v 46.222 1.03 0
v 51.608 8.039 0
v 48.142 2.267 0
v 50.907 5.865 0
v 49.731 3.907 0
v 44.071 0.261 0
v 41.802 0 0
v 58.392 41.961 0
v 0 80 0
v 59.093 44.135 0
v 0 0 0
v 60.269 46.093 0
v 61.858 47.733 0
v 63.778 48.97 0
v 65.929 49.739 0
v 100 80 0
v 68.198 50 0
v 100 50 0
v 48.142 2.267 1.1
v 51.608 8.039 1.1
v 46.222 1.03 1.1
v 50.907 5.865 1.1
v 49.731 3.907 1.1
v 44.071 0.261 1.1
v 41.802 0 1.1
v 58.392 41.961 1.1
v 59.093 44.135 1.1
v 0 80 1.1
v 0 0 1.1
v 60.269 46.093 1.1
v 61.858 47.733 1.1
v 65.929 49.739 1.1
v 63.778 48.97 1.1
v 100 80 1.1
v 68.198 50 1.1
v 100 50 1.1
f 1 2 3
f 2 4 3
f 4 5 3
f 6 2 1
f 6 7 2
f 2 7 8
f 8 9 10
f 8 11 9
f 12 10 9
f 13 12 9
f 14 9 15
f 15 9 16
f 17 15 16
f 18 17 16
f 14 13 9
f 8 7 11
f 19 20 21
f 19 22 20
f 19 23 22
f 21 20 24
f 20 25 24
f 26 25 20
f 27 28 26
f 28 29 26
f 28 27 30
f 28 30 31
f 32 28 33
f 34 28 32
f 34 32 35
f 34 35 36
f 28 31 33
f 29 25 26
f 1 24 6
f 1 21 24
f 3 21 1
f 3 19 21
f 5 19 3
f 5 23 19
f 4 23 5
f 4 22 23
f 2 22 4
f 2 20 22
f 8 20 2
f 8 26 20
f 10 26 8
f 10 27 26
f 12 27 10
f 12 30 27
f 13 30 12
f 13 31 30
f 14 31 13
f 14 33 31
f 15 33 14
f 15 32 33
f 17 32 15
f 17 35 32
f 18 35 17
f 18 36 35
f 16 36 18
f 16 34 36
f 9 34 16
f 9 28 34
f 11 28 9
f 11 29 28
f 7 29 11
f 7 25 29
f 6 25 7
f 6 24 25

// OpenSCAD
// file: fillet.scad
//  openSCAD functions
//  https://github.com/dinther/openSCAD_functions
//
//  Note:
//      fillet uses three other helper functions:
//          ellipseArc
//              ellipseCenter
//              segments
//
//      These functions can be useful in themselves but can also be substituted
//      The relevant lines are surrounded by empty lines in the ellipseArc function.


//  function segments(r)
//
//  Calculates how many segments per 360 degrees would be used
//  with the current $fn, $fa and $fs setings and given radius.
//  r           average radius of the curve.
//
//  return      number of segments required for 360 degrees
function segments(r=1) = $fn>0?($fn>=3?$fn:3):ceil(max(min(360/$fa,abs(r)*2*PI/$fs),5));

//  function ellipseCenter(p1, p2, rx, ry, angle, long, ccw)
//
//  Calculates center of a ellipse rx, ry rotated to angle that runs through both p1 and p2.
//  p1          2D start point for the arc segment.
//  p2          2D end point of the arc segment.
//  rx          x radius for the ellipse when angle = 0
//  ry          y radius for the ellipse when angle = 0
//  angle       rotation angle of the ellipse around it's center point.
//  long        Two ways around the ellipse. Set to true to take the long way.
//  ccw         Set to true of you want the acr drawn following the ellipse counter clock wize.
//
//  return      List with two values.
//      return[0]   2D point list forming a polyline representing the ellipseArc.
//      return[1]   2D point which represents the position of the ellipse center point.
function ellipseCenter(p1=[], p2=[], rx, ry, angle=0, long=false, ccw=false)= let(
P = [[cos(-angle), sin(-angle)], [-sin(-angle), cos(-angle)]] * ((p1-p2)*0.5),
x = P[0], y = P[1], a =  ((x * x) / (rx * rx) ) + ( (y * y) / (ry * ry) ),
rx = a > 1? (sqrt(a) * abs(rx)) : abs(rx), ry = a > 1? (sqrt(a) * abs(ry)) : abs(ry),
co = (long == ccw? 1 : -1) * sqrt(( (rx*rx*ry*ry) - (rx*rx*y*y) - (ry*ry*x*x) ) / ( (rx*rx*y*y) + (ry*ry*x*x) )),
C = ([[ cos(-angle), -sin(-angle)],[sin(-angle), cos(-angle)]] * [rx*y/ry, -ry*x/rx] * co) + ((p1+p2)*0.5)) C;


//  function ellipseArc(p1, p2, rx, ry, angle, long, ccw)
//
//  Produces a list of 2D points that approximates the arc segment required to from p1 to p2.
//  p1          2D start point for the arc segment.
//  p2          2D end point of the arc segment.
//  rx          x radius for the ellipse when angle = 0
//  ry          y radius for the ellipse when angle = 0
//  angle       rotation angle of the ellipse around it's center point.
//  long        Two ways around the ellipse. Set to true to take the long way.
//  ccw         Set to true of you want the acr drawn following the ellipse counter clock wize.
//
//  return      List with two values.
//      return[0]   2D point list forming a polyline representing the ellipseArc.
//      return[1]   2D point which represents the position of the ellipse center point.
function ellipseArc(p1=[], p2=[], rx, ry, angle=0, long=false, ccw=false) = rx==0||ry==0? [p1,p2] : let(
    d = norm(p2-p1),
    e = assert(rx*2>=d, str("Radius:",rx," is too small for distance:",d)),
   
    pc = ellipseCenter(p2,p1,rx,ry,angle, long, ccw),
    
    m = [[cos(angle), -sin(angle)],[sin(angle), cos(angle)]],
    nm = [[cos(-angle), -sin(-angle)],[sin(-angle), cos(-angle)]],
    v1 = (p1-pc) * nm, v2 = (p2-pc) * nm,
    a1 = (v1[1]<0? 180 : 0)+ atan2(v1[0]/v1[1],rx/ry),
    a2 = (v2[1]<0? 180 : 0)+ atan2(v2[0]/v2[1],rx/ry),
    da = abs(a2 - a1 % 360), das = da<=180? da : 360-da,
    cda = long? 360-das : das,
    
    s = segments((rx+ry)/2),
    
    steps = floor(abs(cda*s/360)), sa = ccw? -(cda/steps) : cda/steps,
    pts = steps<=2? [p1,p2] : [p1,for(i=[1:steps-1]) let(a = a1 + (sa * i)%360) pc+[sin(a) * rx , cos(a) * ry] * m, p2]
) [pts,concat(pc,0)];

//  function chamfer(pts, index, size)
//
//  Replaces the point indicated by index with a symetrical chamfer of given size.
//  pts         List of 2D points that needs a point chamfered.
//  index       Index to the point to which the chamfer should be applied.
//  size        width of the chamfer.
//  return      List with 2D points with chamfer applied.

function fillet(pts, index, radius) = let(
    a = index==0? pts[len(pts)-1] : pts[index-1],
    b = pts[index],
    c = index == len(pts)-1? pts[0]:pts[index+1],
    ba = a-b,
    bc = c-b,
    l1 = norm(ba),
    l2 = norm(bc),
    cos_angle = ba * bc / (l1 * l2),
    tan_half_angle = sqrt((1 - cos_angle) / (1 + cos_angle)),
    bf_length = abs(radius) / tan_half_angle,
    ba_u = ba/l1,
    bc_u = bc/l2,
    bf = ba_u*bf_length,
    bg = bc_u*bf_length,
    f = b + bf,
    g = b + bg,
    e1=assert(tan_half_angle!=0, "Fillet is not possible on angles of 0 degrees"),
    e2=assert(bf_length<l1 || bf_length<l2, str("Fillet can not be applied. Max radius is ",min(l1, l2))),
    sig = sign(ba[0] * bc[1] - ba[1] * bc[0]) * (radius<0? -1 : 1),
    
    ps = ellipseArc(f, g, abs(radius), abs(radius), 0, false, sig<0)[0]
    
) concat(index>0? [for (i=[0:index-1]) pts[i]] : [], ps, index<len(pts)-1? [for (i=[index+1: len(pts)-1]) pts[i]] : []);
    
//  quick test
//  polygon(fillet([[0,0],[40,0],[50,30]], 1, 10));
// main file
//  fillet Demo part of openSCAD functions
//  https://github.com/dinther/openSCAD_functions

include <fillet.scad>

pts = [[0,0],[50,0],[60,50],[100,50], [100,80], [0,80]];

fillet_radius = 10;
point_index1 = 2;  //  outer fillet
point_index2 = 1;  //  inner fillet
pts1 = fillet(pts, point_index1, fillet_radius);
pts2 = fillet(pts1, point_index2, fillet_radius);


color("red") linear_extrude(1.1) polygon(pts2);
